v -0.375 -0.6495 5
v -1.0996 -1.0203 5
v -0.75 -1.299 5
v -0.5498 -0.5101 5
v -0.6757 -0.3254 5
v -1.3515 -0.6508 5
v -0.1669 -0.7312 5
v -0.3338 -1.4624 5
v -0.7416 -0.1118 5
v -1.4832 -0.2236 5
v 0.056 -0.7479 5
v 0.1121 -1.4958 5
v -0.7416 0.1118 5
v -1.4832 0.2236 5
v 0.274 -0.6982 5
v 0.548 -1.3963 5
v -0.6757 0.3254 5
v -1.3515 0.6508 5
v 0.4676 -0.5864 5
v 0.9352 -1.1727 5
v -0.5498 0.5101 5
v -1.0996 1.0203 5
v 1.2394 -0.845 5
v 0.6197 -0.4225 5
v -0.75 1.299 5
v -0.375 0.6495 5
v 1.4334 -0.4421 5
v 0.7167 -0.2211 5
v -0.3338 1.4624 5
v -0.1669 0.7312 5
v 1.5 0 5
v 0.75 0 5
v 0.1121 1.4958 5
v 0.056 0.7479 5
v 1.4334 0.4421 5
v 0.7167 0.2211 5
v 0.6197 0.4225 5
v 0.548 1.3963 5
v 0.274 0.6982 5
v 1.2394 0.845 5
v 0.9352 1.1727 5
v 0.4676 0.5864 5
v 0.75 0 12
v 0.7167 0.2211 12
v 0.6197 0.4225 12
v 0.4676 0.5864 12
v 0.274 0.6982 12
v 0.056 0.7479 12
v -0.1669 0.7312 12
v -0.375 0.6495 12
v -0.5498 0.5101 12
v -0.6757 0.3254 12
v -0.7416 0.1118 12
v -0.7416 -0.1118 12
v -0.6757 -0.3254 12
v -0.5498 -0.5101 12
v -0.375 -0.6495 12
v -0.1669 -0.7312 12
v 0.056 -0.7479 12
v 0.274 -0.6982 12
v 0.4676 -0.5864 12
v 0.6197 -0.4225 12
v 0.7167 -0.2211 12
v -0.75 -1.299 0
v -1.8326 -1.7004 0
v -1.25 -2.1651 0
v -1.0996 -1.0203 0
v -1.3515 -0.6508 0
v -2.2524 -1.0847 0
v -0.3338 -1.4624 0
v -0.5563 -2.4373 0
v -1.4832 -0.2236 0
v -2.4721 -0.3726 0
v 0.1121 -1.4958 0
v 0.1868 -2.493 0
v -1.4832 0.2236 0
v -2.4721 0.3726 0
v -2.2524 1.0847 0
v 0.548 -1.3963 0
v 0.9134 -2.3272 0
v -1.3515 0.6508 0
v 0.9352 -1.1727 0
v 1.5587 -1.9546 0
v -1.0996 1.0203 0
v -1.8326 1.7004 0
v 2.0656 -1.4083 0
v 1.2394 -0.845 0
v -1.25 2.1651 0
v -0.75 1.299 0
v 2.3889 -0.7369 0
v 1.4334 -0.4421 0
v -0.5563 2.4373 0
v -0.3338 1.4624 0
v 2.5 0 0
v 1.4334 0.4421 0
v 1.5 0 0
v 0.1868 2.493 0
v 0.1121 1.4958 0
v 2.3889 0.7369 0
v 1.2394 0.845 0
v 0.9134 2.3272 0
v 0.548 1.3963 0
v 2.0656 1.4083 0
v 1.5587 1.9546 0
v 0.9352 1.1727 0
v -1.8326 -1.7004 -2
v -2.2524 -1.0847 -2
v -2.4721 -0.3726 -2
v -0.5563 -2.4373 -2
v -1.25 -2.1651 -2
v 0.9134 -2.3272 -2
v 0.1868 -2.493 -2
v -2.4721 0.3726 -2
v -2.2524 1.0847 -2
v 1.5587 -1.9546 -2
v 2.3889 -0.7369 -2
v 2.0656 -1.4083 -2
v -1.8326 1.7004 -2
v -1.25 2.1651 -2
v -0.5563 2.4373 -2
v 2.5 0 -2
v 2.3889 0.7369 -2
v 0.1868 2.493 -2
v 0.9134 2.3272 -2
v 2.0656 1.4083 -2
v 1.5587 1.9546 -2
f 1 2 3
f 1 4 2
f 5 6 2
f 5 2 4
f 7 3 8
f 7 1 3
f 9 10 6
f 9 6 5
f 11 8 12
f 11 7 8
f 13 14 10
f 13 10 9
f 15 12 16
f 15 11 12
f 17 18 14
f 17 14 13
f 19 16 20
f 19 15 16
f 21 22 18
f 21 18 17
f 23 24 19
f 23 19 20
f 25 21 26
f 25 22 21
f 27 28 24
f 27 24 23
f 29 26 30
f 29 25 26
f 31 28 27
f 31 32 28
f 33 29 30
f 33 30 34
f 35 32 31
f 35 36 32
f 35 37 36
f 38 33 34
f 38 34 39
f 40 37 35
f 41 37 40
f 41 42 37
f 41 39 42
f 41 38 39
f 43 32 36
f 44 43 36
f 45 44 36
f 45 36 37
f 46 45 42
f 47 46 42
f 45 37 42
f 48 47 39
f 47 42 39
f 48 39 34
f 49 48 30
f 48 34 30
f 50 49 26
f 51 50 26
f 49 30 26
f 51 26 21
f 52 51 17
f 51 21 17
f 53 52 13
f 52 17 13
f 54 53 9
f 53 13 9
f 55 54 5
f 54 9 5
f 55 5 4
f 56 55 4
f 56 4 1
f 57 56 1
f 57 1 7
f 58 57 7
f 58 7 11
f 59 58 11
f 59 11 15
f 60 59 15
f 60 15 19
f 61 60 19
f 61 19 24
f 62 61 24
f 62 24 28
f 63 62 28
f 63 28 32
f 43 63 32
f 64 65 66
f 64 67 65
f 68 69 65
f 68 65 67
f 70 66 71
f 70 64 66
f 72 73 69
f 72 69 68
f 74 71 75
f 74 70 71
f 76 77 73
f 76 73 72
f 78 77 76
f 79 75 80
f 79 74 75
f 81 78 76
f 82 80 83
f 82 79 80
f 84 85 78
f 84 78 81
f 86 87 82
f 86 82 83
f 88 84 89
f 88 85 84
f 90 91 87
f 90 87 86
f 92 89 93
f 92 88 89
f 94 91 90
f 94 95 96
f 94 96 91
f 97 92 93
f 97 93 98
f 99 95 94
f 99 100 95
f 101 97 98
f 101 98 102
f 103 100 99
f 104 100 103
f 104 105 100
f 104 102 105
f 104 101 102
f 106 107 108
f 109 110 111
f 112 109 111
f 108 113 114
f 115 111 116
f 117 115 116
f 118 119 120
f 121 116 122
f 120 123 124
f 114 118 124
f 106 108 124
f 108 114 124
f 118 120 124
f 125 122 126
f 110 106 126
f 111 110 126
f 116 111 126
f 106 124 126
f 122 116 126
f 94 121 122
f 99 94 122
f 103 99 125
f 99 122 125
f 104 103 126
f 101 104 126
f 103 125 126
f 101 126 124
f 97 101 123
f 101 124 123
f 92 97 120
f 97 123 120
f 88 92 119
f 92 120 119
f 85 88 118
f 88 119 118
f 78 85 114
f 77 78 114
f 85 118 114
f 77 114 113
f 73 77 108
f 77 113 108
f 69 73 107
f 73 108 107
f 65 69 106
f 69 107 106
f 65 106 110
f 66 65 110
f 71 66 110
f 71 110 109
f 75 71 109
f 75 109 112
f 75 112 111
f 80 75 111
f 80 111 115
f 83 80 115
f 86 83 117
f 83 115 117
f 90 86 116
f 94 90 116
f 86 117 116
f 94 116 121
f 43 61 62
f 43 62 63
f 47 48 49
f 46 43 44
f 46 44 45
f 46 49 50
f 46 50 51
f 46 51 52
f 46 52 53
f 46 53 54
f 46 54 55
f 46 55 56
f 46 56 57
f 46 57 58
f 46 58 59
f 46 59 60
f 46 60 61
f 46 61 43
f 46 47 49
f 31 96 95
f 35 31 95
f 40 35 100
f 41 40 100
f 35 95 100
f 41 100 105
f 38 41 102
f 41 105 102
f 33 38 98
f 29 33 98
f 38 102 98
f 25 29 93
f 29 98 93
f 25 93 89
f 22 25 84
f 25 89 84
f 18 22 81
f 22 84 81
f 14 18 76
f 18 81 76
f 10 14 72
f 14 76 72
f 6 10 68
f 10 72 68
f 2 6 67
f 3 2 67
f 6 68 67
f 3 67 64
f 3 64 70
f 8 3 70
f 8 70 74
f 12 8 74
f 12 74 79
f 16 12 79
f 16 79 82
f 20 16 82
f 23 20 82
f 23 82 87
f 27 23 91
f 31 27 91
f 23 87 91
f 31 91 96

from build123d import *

# Parameters (mm, degrees)
SKETCH1_R           = 0.75
BOSS_EXTRUDE1_DEPTH = 12
SKETCH1_3_R         = 1.5
SKETCH1_3_R_2       = 0.75
BOSS_EXTRUDE2_DEPTH = 5
SKETCH1_4_R         = 2.5
BOSS_EXTRUDE3_DEPTH = 2


with BuildPart() as part:
    # Sketch1 → Boss-Extrude1 (new body)
    with BuildSketch(Plane.XY):
        Circle(SKETCH1_R)
    extrude(amount=BOSS_EXTRUDE1_DEPTH)

    # Sketch1<3> → Boss-Extrude2 (add)
    with BuildSketch(Plane.XY):
        Circle(SKETCH1_3_R)
        Circle(SKETCH1_3_R_2, mode=Mode.SUBTRACT)
    extrude(amount=BOSS_EXTRUDE2_DEPTH)

    # Sketch1<4> → Boss-Extrude3 (add)
    with BuildSketch(Plane.XY):
        Circle(SKETCH1_4_R)
    extrude(amount=-BOSS_EXTRUDE3_DEPTH)


solid = part.part
